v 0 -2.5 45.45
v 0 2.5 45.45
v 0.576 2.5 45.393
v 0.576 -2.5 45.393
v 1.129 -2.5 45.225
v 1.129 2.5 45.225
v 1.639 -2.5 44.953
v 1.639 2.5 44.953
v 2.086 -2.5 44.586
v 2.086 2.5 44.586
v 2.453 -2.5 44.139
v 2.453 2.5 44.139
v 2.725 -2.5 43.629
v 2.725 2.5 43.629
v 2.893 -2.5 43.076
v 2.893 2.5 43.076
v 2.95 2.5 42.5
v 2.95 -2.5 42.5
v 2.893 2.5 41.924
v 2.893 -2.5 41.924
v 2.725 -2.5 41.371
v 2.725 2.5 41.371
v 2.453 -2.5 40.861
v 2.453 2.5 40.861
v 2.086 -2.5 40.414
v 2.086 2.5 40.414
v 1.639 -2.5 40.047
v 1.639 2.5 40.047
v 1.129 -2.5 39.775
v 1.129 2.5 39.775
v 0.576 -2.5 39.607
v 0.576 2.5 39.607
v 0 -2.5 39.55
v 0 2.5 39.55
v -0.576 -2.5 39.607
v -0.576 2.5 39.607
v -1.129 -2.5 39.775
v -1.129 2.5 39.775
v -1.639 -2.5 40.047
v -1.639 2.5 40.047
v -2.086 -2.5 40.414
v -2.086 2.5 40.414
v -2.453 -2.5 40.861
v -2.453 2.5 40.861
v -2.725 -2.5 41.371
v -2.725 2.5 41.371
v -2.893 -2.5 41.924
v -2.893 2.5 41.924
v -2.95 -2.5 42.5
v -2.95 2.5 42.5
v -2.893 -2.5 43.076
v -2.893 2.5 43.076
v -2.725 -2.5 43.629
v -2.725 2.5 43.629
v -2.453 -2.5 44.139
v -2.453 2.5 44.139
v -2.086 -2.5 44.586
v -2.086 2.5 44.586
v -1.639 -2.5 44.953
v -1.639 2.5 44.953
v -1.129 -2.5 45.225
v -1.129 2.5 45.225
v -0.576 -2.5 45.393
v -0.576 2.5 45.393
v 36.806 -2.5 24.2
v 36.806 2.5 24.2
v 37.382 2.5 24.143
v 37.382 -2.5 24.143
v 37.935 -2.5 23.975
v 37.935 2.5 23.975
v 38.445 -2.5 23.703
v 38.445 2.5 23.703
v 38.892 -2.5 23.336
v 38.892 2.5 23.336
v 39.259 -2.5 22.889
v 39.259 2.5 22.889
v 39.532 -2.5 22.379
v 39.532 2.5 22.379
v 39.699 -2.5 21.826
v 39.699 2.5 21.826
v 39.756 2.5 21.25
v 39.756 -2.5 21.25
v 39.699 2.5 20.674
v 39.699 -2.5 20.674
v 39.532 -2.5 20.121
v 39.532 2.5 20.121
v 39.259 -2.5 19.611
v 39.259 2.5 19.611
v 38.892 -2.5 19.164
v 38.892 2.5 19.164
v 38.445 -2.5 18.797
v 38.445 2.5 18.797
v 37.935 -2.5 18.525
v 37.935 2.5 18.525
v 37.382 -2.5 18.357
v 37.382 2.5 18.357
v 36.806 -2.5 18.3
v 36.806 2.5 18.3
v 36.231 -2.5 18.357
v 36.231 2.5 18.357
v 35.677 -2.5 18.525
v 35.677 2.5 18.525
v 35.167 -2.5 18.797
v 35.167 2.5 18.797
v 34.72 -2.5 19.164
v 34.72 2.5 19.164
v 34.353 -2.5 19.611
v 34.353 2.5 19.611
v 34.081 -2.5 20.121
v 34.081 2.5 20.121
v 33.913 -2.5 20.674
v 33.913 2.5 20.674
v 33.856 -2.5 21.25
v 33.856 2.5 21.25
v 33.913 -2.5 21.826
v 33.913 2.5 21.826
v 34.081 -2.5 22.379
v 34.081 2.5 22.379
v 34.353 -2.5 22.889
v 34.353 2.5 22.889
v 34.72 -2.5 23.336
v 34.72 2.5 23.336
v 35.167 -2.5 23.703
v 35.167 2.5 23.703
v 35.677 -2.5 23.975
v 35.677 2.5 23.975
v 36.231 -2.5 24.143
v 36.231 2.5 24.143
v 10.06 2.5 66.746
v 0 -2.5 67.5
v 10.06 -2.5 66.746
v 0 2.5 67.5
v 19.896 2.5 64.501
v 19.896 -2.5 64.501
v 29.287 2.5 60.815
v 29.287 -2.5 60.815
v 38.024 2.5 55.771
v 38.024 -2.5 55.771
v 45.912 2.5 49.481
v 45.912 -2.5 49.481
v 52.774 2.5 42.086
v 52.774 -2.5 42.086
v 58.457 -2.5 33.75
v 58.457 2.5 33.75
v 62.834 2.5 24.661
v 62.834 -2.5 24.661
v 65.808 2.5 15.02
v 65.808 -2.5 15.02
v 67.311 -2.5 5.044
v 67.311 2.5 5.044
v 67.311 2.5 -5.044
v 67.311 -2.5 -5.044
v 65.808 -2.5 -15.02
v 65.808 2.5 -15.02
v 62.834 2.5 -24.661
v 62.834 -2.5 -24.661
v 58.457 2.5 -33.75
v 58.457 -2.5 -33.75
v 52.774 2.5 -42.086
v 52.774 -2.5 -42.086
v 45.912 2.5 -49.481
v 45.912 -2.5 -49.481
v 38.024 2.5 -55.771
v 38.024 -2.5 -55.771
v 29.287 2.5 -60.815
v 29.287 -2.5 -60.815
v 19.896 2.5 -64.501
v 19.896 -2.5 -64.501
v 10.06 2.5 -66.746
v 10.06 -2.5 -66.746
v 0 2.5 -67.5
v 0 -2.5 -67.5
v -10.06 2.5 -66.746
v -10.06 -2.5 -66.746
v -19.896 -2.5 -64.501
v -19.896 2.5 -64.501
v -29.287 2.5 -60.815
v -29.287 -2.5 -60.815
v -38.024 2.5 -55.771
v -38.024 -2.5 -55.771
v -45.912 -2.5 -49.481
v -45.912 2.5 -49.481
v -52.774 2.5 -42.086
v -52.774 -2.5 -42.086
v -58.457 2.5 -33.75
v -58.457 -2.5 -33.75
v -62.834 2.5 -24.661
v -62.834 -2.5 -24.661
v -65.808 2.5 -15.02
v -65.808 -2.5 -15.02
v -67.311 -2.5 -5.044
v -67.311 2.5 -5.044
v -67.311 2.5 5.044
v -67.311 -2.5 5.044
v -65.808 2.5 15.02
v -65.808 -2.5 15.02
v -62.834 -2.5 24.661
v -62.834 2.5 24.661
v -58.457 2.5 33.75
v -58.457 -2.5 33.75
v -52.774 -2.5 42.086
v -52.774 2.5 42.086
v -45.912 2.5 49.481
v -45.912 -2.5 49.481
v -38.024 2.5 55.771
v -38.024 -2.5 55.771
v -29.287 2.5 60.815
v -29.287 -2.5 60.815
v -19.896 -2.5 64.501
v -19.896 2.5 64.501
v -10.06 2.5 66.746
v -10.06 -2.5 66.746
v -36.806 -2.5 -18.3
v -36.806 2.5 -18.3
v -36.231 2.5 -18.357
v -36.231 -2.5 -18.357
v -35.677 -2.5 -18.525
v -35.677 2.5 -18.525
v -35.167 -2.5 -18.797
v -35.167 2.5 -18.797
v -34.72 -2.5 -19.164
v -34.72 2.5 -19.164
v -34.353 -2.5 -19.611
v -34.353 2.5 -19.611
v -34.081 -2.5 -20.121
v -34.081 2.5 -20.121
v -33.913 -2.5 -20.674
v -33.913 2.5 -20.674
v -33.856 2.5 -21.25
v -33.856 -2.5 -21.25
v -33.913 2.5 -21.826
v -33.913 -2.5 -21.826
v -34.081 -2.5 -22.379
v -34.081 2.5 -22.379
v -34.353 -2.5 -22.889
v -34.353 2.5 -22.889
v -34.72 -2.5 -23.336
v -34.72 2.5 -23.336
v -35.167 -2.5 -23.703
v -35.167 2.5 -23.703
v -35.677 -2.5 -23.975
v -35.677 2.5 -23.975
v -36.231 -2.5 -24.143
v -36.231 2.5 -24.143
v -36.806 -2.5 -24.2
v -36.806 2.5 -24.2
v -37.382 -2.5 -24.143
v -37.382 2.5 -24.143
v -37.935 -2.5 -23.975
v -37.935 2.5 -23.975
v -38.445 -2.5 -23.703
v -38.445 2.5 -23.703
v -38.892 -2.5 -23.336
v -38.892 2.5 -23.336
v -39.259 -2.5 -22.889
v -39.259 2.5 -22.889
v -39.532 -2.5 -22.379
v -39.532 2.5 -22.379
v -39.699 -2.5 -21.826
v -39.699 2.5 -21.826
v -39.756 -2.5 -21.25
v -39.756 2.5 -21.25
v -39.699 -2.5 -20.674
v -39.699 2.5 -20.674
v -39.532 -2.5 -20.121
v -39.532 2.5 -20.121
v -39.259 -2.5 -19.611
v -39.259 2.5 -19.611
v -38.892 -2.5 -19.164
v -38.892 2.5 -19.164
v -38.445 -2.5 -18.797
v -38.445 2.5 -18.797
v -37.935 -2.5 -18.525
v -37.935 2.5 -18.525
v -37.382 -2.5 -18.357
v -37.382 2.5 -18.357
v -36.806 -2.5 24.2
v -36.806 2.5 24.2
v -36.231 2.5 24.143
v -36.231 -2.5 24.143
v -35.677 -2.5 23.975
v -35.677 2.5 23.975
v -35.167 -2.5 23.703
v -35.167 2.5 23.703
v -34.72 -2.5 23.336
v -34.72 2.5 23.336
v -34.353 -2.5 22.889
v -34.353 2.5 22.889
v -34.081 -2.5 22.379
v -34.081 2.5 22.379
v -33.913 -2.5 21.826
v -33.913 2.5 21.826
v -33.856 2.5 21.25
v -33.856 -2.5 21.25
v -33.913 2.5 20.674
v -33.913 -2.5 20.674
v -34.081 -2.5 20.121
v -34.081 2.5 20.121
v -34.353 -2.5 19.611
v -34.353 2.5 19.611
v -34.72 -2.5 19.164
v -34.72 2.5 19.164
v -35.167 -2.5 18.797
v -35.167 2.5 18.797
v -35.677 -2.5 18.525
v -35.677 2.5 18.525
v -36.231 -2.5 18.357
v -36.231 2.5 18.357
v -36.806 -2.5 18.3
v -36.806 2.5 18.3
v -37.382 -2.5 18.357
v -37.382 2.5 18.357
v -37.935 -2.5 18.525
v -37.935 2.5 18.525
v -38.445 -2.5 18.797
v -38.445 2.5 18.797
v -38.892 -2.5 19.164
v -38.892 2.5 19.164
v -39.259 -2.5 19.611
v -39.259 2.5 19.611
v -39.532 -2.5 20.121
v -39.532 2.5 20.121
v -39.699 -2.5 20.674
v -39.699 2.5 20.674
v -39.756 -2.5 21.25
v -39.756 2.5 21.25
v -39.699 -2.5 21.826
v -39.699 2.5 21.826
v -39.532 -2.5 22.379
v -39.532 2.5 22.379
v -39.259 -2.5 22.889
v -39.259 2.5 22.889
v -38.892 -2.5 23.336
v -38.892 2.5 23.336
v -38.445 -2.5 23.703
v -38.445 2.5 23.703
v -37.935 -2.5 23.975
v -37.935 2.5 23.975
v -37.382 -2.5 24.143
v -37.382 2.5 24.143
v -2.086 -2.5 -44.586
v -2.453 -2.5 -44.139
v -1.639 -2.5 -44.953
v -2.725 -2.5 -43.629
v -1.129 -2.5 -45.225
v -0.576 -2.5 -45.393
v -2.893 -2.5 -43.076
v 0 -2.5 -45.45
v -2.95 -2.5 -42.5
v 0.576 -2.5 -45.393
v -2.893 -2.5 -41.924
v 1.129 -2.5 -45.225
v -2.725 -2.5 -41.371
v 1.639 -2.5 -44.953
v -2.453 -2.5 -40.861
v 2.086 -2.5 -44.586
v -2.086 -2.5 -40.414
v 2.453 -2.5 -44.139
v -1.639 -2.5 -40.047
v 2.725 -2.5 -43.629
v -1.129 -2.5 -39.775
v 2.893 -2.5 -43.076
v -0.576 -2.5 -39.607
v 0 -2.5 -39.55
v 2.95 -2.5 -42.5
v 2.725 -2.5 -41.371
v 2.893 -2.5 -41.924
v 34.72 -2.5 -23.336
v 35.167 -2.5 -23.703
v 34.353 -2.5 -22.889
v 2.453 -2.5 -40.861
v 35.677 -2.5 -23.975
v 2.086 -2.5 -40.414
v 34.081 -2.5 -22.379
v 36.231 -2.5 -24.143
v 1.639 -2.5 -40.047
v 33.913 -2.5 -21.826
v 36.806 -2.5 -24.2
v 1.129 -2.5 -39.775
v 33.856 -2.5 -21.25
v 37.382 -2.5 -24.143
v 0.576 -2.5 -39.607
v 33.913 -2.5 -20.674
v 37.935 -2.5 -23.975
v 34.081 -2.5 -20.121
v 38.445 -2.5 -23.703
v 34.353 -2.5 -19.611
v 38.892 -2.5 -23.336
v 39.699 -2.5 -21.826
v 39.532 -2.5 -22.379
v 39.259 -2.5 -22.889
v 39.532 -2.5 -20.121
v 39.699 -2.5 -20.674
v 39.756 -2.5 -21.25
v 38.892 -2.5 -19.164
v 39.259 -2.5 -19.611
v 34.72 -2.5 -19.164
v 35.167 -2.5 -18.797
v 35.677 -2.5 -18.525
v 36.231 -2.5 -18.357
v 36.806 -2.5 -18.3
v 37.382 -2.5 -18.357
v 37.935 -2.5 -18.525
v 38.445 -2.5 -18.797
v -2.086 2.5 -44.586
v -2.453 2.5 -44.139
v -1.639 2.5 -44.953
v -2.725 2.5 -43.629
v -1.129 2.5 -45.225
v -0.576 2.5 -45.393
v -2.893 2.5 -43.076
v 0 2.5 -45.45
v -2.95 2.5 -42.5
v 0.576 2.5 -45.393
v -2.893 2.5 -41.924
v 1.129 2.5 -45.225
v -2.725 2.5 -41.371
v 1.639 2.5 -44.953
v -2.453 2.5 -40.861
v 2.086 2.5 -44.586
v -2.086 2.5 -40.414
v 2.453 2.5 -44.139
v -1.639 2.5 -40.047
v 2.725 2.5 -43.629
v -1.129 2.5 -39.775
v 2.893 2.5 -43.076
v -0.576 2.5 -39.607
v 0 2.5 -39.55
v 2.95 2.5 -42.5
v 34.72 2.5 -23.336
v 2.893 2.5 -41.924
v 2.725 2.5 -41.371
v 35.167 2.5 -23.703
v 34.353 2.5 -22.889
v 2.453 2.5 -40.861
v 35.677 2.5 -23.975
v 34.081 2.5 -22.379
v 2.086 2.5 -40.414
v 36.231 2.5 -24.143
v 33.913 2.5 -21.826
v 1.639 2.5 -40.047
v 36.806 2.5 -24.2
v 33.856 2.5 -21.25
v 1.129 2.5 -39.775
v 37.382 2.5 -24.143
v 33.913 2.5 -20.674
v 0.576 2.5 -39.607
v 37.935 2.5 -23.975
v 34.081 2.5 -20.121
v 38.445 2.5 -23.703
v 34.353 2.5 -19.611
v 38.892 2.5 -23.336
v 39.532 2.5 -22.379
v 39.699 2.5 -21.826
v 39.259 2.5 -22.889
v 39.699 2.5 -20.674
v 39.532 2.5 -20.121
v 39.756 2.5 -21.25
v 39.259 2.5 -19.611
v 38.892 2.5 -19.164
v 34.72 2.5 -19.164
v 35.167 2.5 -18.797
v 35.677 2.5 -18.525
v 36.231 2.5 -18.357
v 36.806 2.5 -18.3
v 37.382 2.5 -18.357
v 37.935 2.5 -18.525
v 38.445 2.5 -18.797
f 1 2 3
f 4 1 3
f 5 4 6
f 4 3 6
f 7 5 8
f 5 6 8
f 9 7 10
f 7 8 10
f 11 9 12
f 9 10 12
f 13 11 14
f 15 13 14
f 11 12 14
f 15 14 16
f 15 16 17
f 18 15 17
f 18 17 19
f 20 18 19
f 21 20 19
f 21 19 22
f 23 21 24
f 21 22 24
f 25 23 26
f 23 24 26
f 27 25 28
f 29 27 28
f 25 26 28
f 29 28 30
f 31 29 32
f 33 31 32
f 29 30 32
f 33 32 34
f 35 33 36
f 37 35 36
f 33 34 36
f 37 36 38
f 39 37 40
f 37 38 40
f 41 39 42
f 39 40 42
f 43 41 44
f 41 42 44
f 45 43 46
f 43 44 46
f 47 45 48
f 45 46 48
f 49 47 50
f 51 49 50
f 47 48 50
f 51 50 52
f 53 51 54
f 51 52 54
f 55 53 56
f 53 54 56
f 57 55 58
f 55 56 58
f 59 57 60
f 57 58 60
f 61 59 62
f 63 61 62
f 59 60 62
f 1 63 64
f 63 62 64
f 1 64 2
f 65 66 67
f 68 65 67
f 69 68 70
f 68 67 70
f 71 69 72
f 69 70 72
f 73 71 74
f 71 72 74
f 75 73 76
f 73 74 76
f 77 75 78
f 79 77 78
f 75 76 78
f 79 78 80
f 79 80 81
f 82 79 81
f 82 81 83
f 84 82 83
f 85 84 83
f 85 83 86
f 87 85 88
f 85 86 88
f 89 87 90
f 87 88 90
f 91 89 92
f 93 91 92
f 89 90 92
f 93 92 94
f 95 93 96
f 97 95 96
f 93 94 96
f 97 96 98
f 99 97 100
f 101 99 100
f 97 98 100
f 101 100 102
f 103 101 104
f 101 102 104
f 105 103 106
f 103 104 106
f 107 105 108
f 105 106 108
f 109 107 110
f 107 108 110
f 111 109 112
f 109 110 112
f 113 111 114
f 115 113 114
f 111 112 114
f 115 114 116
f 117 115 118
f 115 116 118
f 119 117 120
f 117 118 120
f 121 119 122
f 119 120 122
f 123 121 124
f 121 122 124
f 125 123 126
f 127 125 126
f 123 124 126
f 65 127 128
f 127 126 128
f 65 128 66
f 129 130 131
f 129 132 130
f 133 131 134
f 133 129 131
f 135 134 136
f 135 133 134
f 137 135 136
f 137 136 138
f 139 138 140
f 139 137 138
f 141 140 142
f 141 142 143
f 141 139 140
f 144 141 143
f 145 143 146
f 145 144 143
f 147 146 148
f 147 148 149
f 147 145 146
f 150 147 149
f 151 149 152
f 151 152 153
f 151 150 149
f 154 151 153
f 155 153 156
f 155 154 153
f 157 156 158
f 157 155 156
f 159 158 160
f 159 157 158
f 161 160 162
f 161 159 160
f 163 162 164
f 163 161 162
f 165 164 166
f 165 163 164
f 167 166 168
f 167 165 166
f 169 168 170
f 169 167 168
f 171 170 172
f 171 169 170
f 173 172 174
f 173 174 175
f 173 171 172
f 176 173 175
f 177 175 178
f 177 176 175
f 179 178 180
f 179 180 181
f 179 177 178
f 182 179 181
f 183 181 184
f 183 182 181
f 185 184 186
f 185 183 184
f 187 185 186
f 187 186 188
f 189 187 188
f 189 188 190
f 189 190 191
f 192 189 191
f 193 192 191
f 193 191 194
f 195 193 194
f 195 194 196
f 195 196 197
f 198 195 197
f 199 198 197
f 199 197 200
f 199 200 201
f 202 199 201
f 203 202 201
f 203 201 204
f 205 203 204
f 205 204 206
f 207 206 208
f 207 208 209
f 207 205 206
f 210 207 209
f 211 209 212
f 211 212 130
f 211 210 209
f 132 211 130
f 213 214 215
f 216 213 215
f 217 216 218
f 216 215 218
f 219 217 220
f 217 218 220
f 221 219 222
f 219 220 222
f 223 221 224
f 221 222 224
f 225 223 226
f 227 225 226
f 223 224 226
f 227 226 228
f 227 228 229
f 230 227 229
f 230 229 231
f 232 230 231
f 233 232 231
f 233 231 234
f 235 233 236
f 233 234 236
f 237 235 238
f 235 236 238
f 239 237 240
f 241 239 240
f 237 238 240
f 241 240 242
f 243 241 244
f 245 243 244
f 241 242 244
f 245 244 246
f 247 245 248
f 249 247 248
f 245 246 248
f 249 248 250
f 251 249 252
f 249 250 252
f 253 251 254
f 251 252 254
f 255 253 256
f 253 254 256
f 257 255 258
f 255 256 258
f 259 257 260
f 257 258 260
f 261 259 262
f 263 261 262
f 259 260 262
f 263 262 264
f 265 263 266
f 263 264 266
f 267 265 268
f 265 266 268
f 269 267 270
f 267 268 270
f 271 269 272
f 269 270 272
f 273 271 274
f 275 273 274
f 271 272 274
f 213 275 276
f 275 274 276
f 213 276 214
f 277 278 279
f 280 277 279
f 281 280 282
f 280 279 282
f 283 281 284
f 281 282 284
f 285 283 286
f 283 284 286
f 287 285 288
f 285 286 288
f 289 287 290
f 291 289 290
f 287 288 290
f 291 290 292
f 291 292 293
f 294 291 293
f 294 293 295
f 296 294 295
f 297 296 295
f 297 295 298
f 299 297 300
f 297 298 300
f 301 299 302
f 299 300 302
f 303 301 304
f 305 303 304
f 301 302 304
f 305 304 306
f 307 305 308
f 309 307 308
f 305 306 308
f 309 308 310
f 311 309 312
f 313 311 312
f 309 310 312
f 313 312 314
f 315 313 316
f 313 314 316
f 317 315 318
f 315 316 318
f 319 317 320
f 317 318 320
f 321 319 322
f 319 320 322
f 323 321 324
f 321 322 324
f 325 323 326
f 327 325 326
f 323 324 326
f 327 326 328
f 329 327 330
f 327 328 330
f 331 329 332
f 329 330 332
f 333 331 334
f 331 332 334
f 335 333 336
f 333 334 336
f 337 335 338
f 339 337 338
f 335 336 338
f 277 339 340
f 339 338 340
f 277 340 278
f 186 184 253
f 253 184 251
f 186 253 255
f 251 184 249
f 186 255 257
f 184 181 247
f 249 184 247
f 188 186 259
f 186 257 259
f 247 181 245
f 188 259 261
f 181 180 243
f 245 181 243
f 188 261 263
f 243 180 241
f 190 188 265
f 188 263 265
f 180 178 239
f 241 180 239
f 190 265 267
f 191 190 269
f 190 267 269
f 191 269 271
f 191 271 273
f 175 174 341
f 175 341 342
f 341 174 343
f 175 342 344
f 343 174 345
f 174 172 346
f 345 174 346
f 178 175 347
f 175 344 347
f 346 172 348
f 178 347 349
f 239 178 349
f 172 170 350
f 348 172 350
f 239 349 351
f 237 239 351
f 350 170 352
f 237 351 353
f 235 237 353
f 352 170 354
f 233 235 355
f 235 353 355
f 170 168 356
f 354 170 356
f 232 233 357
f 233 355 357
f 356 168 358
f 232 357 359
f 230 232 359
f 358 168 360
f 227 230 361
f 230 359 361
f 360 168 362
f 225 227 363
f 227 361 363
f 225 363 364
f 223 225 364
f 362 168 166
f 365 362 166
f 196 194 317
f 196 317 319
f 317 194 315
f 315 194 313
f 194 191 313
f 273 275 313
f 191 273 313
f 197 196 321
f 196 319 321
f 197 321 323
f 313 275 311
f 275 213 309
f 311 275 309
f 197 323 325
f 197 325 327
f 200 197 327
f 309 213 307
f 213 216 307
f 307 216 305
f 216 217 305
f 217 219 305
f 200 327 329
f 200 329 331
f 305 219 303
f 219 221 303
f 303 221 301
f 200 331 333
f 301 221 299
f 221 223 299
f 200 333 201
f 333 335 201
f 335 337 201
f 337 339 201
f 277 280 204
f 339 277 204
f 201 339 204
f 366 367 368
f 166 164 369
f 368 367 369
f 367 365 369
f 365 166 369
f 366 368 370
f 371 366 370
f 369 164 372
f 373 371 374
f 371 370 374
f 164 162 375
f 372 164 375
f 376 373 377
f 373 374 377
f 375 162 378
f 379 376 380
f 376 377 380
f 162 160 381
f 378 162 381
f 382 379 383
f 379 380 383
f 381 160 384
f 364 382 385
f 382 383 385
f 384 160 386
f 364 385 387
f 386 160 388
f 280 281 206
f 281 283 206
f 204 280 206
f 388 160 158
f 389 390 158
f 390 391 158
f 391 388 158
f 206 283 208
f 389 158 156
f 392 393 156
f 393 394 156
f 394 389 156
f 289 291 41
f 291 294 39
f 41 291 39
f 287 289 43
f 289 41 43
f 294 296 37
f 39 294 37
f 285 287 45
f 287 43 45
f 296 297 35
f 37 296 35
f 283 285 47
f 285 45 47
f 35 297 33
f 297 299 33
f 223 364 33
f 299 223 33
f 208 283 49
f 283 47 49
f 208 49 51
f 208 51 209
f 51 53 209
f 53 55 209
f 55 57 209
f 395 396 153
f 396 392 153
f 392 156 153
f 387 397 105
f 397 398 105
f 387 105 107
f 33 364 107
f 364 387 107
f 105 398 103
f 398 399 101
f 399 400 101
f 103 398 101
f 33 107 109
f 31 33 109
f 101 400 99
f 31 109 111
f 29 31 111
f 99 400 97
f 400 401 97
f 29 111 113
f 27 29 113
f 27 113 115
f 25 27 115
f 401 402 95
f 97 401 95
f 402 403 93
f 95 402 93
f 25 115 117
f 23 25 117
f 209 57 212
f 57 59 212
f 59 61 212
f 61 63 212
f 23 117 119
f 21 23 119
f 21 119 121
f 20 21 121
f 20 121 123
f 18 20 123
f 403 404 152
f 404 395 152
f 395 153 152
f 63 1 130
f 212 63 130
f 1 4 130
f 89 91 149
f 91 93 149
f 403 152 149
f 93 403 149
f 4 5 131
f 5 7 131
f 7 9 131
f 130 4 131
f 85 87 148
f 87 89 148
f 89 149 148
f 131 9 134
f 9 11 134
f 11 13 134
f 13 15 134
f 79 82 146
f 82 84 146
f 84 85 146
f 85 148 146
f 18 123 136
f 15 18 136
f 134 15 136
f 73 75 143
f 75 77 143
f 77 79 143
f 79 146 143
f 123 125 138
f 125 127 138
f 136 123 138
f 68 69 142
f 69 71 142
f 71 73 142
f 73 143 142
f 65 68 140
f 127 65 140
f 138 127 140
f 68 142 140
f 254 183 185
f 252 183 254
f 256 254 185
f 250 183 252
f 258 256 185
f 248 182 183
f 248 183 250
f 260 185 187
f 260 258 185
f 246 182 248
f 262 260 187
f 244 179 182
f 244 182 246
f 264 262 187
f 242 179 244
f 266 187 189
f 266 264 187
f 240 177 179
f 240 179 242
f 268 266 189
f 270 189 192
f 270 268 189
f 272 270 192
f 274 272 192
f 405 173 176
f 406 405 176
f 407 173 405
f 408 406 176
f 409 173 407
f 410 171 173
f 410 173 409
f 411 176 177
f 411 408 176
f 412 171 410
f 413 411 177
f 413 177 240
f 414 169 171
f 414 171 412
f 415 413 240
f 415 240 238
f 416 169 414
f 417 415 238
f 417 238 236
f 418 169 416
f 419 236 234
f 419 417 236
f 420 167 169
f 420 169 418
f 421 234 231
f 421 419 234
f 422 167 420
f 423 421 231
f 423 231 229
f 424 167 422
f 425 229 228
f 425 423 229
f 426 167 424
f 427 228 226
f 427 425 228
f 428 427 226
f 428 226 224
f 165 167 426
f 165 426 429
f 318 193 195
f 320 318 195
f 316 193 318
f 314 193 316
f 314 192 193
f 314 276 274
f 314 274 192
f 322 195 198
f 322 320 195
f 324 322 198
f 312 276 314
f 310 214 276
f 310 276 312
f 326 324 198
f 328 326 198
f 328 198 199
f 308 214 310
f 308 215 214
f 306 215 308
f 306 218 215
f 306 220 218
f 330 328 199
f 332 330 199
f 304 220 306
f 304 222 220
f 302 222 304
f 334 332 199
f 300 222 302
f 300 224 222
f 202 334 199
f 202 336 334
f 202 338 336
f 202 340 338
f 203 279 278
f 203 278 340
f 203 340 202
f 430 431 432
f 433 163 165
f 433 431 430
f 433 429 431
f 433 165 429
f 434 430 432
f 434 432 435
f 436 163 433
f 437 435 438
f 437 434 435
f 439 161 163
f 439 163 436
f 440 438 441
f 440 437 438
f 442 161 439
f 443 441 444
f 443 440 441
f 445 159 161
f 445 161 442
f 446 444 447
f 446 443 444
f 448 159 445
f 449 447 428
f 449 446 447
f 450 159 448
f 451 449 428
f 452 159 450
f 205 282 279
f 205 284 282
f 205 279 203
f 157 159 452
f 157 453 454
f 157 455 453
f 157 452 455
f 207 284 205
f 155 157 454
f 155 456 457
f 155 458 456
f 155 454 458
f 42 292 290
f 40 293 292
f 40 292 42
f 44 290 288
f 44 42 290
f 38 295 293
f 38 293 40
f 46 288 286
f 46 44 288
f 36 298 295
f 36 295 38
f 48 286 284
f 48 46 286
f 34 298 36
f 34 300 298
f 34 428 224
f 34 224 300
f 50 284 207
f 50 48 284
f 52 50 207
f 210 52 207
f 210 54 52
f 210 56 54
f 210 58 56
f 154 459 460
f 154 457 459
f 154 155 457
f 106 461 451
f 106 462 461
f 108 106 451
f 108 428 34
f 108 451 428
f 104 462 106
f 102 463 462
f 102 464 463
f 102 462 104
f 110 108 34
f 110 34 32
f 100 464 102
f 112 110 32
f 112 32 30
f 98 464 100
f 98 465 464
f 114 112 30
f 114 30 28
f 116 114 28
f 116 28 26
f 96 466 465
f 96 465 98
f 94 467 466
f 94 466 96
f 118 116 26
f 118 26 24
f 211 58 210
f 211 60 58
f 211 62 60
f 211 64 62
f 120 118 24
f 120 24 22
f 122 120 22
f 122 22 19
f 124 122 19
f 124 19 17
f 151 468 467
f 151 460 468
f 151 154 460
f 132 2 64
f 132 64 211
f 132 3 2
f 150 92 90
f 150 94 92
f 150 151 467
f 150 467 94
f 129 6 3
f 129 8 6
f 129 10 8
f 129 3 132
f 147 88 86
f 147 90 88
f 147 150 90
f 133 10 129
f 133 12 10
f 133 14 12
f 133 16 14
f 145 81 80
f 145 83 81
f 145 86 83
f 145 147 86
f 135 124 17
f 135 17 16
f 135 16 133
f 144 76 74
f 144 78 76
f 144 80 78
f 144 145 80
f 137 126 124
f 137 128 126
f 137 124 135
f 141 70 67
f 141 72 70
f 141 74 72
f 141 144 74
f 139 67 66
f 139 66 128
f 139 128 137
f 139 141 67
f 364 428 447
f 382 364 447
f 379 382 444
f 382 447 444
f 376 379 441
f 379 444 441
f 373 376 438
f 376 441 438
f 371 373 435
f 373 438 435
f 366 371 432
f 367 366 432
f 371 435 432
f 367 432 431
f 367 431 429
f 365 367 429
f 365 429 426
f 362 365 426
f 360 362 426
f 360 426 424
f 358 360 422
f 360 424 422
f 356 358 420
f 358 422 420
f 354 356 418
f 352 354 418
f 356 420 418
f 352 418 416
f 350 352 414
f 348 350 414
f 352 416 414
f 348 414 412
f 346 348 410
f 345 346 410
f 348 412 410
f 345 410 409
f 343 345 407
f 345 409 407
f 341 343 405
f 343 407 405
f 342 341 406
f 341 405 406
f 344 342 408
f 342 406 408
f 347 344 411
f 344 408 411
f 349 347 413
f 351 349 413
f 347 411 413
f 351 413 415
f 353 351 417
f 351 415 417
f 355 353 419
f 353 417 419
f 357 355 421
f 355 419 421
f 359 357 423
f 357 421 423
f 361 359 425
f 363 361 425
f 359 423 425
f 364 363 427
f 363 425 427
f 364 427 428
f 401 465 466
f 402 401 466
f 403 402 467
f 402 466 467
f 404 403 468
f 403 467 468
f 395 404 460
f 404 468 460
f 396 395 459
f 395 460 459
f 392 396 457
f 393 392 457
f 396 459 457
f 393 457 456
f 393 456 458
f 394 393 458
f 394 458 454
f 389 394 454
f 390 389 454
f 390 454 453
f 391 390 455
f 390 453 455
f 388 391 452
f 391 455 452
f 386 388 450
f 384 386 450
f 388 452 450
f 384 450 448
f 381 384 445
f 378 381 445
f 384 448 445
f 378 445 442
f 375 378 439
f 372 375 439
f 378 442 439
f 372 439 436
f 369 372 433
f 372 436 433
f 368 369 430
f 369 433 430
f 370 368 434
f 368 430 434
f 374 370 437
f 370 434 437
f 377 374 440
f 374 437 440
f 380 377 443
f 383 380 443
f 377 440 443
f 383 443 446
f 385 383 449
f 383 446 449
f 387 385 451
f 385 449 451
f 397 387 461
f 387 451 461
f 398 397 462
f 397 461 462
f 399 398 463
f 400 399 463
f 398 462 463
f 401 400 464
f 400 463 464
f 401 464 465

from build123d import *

# Parameters (mm, degrees)
SKETCH1_R           = 67.5
BOSS_EXTRUDE1_DEPTH = 2.5
SKETCH2_R           = 2.95
CUT_EXTRUDE1_DEPTH  = 5


with BuildPart() as part:
    # Sketch1 → Boss-Extrude1 (new, symmetric)
    with BuildSketch(Plane(origin=(0, 0, 0), x_dir=(1, 0, 0), z_dir=(0, 1, 0))):
        with Locations(Location((0, 0, 0), (0, 0, 270))):
            Circle(SKETCH1_R)
    extrude(amount=BOSS_EXTRUDE1_DEPTH, both=True)

    # Sketch2 → Cut-Extrude1 (cut)
    with BuildSketch(Plane(origin=(0, 2.5, 0), x_dir=(1, 0, 0), z_dir=(0, 1, 0))):
        with Locations(Location((0, 42.5, 0), (0, 0, 270))):
            Circle(SKETCH2_R)
        with Locations(Location((36.806079661, 21.25, 0), (0, 0, 270))):
            Circle(SKETCH2_R)
        with Locations(Location((36.806079661, -21.25, 0), (0, 0, 270))):
            Circle(SKETCH2_R)
        with Locations(Location((0, -42.5, 0), (0, 0, 270))):
            Circle(SKETCH2_R)
        with Locations(Location((-36.806079661, -21.25, 0), (0, 0, 270))):
            Circle(SKETCH2_R)
        with Locations(Location((-36.806079661, 21.25, 0), (0, 0, 270))):
            Circle(SKETCH2_R)
    extrude(amount=-CUT_EXTRUDE1_DEPTH, mode=Mode.SUBTRACT)


solid = part.part
